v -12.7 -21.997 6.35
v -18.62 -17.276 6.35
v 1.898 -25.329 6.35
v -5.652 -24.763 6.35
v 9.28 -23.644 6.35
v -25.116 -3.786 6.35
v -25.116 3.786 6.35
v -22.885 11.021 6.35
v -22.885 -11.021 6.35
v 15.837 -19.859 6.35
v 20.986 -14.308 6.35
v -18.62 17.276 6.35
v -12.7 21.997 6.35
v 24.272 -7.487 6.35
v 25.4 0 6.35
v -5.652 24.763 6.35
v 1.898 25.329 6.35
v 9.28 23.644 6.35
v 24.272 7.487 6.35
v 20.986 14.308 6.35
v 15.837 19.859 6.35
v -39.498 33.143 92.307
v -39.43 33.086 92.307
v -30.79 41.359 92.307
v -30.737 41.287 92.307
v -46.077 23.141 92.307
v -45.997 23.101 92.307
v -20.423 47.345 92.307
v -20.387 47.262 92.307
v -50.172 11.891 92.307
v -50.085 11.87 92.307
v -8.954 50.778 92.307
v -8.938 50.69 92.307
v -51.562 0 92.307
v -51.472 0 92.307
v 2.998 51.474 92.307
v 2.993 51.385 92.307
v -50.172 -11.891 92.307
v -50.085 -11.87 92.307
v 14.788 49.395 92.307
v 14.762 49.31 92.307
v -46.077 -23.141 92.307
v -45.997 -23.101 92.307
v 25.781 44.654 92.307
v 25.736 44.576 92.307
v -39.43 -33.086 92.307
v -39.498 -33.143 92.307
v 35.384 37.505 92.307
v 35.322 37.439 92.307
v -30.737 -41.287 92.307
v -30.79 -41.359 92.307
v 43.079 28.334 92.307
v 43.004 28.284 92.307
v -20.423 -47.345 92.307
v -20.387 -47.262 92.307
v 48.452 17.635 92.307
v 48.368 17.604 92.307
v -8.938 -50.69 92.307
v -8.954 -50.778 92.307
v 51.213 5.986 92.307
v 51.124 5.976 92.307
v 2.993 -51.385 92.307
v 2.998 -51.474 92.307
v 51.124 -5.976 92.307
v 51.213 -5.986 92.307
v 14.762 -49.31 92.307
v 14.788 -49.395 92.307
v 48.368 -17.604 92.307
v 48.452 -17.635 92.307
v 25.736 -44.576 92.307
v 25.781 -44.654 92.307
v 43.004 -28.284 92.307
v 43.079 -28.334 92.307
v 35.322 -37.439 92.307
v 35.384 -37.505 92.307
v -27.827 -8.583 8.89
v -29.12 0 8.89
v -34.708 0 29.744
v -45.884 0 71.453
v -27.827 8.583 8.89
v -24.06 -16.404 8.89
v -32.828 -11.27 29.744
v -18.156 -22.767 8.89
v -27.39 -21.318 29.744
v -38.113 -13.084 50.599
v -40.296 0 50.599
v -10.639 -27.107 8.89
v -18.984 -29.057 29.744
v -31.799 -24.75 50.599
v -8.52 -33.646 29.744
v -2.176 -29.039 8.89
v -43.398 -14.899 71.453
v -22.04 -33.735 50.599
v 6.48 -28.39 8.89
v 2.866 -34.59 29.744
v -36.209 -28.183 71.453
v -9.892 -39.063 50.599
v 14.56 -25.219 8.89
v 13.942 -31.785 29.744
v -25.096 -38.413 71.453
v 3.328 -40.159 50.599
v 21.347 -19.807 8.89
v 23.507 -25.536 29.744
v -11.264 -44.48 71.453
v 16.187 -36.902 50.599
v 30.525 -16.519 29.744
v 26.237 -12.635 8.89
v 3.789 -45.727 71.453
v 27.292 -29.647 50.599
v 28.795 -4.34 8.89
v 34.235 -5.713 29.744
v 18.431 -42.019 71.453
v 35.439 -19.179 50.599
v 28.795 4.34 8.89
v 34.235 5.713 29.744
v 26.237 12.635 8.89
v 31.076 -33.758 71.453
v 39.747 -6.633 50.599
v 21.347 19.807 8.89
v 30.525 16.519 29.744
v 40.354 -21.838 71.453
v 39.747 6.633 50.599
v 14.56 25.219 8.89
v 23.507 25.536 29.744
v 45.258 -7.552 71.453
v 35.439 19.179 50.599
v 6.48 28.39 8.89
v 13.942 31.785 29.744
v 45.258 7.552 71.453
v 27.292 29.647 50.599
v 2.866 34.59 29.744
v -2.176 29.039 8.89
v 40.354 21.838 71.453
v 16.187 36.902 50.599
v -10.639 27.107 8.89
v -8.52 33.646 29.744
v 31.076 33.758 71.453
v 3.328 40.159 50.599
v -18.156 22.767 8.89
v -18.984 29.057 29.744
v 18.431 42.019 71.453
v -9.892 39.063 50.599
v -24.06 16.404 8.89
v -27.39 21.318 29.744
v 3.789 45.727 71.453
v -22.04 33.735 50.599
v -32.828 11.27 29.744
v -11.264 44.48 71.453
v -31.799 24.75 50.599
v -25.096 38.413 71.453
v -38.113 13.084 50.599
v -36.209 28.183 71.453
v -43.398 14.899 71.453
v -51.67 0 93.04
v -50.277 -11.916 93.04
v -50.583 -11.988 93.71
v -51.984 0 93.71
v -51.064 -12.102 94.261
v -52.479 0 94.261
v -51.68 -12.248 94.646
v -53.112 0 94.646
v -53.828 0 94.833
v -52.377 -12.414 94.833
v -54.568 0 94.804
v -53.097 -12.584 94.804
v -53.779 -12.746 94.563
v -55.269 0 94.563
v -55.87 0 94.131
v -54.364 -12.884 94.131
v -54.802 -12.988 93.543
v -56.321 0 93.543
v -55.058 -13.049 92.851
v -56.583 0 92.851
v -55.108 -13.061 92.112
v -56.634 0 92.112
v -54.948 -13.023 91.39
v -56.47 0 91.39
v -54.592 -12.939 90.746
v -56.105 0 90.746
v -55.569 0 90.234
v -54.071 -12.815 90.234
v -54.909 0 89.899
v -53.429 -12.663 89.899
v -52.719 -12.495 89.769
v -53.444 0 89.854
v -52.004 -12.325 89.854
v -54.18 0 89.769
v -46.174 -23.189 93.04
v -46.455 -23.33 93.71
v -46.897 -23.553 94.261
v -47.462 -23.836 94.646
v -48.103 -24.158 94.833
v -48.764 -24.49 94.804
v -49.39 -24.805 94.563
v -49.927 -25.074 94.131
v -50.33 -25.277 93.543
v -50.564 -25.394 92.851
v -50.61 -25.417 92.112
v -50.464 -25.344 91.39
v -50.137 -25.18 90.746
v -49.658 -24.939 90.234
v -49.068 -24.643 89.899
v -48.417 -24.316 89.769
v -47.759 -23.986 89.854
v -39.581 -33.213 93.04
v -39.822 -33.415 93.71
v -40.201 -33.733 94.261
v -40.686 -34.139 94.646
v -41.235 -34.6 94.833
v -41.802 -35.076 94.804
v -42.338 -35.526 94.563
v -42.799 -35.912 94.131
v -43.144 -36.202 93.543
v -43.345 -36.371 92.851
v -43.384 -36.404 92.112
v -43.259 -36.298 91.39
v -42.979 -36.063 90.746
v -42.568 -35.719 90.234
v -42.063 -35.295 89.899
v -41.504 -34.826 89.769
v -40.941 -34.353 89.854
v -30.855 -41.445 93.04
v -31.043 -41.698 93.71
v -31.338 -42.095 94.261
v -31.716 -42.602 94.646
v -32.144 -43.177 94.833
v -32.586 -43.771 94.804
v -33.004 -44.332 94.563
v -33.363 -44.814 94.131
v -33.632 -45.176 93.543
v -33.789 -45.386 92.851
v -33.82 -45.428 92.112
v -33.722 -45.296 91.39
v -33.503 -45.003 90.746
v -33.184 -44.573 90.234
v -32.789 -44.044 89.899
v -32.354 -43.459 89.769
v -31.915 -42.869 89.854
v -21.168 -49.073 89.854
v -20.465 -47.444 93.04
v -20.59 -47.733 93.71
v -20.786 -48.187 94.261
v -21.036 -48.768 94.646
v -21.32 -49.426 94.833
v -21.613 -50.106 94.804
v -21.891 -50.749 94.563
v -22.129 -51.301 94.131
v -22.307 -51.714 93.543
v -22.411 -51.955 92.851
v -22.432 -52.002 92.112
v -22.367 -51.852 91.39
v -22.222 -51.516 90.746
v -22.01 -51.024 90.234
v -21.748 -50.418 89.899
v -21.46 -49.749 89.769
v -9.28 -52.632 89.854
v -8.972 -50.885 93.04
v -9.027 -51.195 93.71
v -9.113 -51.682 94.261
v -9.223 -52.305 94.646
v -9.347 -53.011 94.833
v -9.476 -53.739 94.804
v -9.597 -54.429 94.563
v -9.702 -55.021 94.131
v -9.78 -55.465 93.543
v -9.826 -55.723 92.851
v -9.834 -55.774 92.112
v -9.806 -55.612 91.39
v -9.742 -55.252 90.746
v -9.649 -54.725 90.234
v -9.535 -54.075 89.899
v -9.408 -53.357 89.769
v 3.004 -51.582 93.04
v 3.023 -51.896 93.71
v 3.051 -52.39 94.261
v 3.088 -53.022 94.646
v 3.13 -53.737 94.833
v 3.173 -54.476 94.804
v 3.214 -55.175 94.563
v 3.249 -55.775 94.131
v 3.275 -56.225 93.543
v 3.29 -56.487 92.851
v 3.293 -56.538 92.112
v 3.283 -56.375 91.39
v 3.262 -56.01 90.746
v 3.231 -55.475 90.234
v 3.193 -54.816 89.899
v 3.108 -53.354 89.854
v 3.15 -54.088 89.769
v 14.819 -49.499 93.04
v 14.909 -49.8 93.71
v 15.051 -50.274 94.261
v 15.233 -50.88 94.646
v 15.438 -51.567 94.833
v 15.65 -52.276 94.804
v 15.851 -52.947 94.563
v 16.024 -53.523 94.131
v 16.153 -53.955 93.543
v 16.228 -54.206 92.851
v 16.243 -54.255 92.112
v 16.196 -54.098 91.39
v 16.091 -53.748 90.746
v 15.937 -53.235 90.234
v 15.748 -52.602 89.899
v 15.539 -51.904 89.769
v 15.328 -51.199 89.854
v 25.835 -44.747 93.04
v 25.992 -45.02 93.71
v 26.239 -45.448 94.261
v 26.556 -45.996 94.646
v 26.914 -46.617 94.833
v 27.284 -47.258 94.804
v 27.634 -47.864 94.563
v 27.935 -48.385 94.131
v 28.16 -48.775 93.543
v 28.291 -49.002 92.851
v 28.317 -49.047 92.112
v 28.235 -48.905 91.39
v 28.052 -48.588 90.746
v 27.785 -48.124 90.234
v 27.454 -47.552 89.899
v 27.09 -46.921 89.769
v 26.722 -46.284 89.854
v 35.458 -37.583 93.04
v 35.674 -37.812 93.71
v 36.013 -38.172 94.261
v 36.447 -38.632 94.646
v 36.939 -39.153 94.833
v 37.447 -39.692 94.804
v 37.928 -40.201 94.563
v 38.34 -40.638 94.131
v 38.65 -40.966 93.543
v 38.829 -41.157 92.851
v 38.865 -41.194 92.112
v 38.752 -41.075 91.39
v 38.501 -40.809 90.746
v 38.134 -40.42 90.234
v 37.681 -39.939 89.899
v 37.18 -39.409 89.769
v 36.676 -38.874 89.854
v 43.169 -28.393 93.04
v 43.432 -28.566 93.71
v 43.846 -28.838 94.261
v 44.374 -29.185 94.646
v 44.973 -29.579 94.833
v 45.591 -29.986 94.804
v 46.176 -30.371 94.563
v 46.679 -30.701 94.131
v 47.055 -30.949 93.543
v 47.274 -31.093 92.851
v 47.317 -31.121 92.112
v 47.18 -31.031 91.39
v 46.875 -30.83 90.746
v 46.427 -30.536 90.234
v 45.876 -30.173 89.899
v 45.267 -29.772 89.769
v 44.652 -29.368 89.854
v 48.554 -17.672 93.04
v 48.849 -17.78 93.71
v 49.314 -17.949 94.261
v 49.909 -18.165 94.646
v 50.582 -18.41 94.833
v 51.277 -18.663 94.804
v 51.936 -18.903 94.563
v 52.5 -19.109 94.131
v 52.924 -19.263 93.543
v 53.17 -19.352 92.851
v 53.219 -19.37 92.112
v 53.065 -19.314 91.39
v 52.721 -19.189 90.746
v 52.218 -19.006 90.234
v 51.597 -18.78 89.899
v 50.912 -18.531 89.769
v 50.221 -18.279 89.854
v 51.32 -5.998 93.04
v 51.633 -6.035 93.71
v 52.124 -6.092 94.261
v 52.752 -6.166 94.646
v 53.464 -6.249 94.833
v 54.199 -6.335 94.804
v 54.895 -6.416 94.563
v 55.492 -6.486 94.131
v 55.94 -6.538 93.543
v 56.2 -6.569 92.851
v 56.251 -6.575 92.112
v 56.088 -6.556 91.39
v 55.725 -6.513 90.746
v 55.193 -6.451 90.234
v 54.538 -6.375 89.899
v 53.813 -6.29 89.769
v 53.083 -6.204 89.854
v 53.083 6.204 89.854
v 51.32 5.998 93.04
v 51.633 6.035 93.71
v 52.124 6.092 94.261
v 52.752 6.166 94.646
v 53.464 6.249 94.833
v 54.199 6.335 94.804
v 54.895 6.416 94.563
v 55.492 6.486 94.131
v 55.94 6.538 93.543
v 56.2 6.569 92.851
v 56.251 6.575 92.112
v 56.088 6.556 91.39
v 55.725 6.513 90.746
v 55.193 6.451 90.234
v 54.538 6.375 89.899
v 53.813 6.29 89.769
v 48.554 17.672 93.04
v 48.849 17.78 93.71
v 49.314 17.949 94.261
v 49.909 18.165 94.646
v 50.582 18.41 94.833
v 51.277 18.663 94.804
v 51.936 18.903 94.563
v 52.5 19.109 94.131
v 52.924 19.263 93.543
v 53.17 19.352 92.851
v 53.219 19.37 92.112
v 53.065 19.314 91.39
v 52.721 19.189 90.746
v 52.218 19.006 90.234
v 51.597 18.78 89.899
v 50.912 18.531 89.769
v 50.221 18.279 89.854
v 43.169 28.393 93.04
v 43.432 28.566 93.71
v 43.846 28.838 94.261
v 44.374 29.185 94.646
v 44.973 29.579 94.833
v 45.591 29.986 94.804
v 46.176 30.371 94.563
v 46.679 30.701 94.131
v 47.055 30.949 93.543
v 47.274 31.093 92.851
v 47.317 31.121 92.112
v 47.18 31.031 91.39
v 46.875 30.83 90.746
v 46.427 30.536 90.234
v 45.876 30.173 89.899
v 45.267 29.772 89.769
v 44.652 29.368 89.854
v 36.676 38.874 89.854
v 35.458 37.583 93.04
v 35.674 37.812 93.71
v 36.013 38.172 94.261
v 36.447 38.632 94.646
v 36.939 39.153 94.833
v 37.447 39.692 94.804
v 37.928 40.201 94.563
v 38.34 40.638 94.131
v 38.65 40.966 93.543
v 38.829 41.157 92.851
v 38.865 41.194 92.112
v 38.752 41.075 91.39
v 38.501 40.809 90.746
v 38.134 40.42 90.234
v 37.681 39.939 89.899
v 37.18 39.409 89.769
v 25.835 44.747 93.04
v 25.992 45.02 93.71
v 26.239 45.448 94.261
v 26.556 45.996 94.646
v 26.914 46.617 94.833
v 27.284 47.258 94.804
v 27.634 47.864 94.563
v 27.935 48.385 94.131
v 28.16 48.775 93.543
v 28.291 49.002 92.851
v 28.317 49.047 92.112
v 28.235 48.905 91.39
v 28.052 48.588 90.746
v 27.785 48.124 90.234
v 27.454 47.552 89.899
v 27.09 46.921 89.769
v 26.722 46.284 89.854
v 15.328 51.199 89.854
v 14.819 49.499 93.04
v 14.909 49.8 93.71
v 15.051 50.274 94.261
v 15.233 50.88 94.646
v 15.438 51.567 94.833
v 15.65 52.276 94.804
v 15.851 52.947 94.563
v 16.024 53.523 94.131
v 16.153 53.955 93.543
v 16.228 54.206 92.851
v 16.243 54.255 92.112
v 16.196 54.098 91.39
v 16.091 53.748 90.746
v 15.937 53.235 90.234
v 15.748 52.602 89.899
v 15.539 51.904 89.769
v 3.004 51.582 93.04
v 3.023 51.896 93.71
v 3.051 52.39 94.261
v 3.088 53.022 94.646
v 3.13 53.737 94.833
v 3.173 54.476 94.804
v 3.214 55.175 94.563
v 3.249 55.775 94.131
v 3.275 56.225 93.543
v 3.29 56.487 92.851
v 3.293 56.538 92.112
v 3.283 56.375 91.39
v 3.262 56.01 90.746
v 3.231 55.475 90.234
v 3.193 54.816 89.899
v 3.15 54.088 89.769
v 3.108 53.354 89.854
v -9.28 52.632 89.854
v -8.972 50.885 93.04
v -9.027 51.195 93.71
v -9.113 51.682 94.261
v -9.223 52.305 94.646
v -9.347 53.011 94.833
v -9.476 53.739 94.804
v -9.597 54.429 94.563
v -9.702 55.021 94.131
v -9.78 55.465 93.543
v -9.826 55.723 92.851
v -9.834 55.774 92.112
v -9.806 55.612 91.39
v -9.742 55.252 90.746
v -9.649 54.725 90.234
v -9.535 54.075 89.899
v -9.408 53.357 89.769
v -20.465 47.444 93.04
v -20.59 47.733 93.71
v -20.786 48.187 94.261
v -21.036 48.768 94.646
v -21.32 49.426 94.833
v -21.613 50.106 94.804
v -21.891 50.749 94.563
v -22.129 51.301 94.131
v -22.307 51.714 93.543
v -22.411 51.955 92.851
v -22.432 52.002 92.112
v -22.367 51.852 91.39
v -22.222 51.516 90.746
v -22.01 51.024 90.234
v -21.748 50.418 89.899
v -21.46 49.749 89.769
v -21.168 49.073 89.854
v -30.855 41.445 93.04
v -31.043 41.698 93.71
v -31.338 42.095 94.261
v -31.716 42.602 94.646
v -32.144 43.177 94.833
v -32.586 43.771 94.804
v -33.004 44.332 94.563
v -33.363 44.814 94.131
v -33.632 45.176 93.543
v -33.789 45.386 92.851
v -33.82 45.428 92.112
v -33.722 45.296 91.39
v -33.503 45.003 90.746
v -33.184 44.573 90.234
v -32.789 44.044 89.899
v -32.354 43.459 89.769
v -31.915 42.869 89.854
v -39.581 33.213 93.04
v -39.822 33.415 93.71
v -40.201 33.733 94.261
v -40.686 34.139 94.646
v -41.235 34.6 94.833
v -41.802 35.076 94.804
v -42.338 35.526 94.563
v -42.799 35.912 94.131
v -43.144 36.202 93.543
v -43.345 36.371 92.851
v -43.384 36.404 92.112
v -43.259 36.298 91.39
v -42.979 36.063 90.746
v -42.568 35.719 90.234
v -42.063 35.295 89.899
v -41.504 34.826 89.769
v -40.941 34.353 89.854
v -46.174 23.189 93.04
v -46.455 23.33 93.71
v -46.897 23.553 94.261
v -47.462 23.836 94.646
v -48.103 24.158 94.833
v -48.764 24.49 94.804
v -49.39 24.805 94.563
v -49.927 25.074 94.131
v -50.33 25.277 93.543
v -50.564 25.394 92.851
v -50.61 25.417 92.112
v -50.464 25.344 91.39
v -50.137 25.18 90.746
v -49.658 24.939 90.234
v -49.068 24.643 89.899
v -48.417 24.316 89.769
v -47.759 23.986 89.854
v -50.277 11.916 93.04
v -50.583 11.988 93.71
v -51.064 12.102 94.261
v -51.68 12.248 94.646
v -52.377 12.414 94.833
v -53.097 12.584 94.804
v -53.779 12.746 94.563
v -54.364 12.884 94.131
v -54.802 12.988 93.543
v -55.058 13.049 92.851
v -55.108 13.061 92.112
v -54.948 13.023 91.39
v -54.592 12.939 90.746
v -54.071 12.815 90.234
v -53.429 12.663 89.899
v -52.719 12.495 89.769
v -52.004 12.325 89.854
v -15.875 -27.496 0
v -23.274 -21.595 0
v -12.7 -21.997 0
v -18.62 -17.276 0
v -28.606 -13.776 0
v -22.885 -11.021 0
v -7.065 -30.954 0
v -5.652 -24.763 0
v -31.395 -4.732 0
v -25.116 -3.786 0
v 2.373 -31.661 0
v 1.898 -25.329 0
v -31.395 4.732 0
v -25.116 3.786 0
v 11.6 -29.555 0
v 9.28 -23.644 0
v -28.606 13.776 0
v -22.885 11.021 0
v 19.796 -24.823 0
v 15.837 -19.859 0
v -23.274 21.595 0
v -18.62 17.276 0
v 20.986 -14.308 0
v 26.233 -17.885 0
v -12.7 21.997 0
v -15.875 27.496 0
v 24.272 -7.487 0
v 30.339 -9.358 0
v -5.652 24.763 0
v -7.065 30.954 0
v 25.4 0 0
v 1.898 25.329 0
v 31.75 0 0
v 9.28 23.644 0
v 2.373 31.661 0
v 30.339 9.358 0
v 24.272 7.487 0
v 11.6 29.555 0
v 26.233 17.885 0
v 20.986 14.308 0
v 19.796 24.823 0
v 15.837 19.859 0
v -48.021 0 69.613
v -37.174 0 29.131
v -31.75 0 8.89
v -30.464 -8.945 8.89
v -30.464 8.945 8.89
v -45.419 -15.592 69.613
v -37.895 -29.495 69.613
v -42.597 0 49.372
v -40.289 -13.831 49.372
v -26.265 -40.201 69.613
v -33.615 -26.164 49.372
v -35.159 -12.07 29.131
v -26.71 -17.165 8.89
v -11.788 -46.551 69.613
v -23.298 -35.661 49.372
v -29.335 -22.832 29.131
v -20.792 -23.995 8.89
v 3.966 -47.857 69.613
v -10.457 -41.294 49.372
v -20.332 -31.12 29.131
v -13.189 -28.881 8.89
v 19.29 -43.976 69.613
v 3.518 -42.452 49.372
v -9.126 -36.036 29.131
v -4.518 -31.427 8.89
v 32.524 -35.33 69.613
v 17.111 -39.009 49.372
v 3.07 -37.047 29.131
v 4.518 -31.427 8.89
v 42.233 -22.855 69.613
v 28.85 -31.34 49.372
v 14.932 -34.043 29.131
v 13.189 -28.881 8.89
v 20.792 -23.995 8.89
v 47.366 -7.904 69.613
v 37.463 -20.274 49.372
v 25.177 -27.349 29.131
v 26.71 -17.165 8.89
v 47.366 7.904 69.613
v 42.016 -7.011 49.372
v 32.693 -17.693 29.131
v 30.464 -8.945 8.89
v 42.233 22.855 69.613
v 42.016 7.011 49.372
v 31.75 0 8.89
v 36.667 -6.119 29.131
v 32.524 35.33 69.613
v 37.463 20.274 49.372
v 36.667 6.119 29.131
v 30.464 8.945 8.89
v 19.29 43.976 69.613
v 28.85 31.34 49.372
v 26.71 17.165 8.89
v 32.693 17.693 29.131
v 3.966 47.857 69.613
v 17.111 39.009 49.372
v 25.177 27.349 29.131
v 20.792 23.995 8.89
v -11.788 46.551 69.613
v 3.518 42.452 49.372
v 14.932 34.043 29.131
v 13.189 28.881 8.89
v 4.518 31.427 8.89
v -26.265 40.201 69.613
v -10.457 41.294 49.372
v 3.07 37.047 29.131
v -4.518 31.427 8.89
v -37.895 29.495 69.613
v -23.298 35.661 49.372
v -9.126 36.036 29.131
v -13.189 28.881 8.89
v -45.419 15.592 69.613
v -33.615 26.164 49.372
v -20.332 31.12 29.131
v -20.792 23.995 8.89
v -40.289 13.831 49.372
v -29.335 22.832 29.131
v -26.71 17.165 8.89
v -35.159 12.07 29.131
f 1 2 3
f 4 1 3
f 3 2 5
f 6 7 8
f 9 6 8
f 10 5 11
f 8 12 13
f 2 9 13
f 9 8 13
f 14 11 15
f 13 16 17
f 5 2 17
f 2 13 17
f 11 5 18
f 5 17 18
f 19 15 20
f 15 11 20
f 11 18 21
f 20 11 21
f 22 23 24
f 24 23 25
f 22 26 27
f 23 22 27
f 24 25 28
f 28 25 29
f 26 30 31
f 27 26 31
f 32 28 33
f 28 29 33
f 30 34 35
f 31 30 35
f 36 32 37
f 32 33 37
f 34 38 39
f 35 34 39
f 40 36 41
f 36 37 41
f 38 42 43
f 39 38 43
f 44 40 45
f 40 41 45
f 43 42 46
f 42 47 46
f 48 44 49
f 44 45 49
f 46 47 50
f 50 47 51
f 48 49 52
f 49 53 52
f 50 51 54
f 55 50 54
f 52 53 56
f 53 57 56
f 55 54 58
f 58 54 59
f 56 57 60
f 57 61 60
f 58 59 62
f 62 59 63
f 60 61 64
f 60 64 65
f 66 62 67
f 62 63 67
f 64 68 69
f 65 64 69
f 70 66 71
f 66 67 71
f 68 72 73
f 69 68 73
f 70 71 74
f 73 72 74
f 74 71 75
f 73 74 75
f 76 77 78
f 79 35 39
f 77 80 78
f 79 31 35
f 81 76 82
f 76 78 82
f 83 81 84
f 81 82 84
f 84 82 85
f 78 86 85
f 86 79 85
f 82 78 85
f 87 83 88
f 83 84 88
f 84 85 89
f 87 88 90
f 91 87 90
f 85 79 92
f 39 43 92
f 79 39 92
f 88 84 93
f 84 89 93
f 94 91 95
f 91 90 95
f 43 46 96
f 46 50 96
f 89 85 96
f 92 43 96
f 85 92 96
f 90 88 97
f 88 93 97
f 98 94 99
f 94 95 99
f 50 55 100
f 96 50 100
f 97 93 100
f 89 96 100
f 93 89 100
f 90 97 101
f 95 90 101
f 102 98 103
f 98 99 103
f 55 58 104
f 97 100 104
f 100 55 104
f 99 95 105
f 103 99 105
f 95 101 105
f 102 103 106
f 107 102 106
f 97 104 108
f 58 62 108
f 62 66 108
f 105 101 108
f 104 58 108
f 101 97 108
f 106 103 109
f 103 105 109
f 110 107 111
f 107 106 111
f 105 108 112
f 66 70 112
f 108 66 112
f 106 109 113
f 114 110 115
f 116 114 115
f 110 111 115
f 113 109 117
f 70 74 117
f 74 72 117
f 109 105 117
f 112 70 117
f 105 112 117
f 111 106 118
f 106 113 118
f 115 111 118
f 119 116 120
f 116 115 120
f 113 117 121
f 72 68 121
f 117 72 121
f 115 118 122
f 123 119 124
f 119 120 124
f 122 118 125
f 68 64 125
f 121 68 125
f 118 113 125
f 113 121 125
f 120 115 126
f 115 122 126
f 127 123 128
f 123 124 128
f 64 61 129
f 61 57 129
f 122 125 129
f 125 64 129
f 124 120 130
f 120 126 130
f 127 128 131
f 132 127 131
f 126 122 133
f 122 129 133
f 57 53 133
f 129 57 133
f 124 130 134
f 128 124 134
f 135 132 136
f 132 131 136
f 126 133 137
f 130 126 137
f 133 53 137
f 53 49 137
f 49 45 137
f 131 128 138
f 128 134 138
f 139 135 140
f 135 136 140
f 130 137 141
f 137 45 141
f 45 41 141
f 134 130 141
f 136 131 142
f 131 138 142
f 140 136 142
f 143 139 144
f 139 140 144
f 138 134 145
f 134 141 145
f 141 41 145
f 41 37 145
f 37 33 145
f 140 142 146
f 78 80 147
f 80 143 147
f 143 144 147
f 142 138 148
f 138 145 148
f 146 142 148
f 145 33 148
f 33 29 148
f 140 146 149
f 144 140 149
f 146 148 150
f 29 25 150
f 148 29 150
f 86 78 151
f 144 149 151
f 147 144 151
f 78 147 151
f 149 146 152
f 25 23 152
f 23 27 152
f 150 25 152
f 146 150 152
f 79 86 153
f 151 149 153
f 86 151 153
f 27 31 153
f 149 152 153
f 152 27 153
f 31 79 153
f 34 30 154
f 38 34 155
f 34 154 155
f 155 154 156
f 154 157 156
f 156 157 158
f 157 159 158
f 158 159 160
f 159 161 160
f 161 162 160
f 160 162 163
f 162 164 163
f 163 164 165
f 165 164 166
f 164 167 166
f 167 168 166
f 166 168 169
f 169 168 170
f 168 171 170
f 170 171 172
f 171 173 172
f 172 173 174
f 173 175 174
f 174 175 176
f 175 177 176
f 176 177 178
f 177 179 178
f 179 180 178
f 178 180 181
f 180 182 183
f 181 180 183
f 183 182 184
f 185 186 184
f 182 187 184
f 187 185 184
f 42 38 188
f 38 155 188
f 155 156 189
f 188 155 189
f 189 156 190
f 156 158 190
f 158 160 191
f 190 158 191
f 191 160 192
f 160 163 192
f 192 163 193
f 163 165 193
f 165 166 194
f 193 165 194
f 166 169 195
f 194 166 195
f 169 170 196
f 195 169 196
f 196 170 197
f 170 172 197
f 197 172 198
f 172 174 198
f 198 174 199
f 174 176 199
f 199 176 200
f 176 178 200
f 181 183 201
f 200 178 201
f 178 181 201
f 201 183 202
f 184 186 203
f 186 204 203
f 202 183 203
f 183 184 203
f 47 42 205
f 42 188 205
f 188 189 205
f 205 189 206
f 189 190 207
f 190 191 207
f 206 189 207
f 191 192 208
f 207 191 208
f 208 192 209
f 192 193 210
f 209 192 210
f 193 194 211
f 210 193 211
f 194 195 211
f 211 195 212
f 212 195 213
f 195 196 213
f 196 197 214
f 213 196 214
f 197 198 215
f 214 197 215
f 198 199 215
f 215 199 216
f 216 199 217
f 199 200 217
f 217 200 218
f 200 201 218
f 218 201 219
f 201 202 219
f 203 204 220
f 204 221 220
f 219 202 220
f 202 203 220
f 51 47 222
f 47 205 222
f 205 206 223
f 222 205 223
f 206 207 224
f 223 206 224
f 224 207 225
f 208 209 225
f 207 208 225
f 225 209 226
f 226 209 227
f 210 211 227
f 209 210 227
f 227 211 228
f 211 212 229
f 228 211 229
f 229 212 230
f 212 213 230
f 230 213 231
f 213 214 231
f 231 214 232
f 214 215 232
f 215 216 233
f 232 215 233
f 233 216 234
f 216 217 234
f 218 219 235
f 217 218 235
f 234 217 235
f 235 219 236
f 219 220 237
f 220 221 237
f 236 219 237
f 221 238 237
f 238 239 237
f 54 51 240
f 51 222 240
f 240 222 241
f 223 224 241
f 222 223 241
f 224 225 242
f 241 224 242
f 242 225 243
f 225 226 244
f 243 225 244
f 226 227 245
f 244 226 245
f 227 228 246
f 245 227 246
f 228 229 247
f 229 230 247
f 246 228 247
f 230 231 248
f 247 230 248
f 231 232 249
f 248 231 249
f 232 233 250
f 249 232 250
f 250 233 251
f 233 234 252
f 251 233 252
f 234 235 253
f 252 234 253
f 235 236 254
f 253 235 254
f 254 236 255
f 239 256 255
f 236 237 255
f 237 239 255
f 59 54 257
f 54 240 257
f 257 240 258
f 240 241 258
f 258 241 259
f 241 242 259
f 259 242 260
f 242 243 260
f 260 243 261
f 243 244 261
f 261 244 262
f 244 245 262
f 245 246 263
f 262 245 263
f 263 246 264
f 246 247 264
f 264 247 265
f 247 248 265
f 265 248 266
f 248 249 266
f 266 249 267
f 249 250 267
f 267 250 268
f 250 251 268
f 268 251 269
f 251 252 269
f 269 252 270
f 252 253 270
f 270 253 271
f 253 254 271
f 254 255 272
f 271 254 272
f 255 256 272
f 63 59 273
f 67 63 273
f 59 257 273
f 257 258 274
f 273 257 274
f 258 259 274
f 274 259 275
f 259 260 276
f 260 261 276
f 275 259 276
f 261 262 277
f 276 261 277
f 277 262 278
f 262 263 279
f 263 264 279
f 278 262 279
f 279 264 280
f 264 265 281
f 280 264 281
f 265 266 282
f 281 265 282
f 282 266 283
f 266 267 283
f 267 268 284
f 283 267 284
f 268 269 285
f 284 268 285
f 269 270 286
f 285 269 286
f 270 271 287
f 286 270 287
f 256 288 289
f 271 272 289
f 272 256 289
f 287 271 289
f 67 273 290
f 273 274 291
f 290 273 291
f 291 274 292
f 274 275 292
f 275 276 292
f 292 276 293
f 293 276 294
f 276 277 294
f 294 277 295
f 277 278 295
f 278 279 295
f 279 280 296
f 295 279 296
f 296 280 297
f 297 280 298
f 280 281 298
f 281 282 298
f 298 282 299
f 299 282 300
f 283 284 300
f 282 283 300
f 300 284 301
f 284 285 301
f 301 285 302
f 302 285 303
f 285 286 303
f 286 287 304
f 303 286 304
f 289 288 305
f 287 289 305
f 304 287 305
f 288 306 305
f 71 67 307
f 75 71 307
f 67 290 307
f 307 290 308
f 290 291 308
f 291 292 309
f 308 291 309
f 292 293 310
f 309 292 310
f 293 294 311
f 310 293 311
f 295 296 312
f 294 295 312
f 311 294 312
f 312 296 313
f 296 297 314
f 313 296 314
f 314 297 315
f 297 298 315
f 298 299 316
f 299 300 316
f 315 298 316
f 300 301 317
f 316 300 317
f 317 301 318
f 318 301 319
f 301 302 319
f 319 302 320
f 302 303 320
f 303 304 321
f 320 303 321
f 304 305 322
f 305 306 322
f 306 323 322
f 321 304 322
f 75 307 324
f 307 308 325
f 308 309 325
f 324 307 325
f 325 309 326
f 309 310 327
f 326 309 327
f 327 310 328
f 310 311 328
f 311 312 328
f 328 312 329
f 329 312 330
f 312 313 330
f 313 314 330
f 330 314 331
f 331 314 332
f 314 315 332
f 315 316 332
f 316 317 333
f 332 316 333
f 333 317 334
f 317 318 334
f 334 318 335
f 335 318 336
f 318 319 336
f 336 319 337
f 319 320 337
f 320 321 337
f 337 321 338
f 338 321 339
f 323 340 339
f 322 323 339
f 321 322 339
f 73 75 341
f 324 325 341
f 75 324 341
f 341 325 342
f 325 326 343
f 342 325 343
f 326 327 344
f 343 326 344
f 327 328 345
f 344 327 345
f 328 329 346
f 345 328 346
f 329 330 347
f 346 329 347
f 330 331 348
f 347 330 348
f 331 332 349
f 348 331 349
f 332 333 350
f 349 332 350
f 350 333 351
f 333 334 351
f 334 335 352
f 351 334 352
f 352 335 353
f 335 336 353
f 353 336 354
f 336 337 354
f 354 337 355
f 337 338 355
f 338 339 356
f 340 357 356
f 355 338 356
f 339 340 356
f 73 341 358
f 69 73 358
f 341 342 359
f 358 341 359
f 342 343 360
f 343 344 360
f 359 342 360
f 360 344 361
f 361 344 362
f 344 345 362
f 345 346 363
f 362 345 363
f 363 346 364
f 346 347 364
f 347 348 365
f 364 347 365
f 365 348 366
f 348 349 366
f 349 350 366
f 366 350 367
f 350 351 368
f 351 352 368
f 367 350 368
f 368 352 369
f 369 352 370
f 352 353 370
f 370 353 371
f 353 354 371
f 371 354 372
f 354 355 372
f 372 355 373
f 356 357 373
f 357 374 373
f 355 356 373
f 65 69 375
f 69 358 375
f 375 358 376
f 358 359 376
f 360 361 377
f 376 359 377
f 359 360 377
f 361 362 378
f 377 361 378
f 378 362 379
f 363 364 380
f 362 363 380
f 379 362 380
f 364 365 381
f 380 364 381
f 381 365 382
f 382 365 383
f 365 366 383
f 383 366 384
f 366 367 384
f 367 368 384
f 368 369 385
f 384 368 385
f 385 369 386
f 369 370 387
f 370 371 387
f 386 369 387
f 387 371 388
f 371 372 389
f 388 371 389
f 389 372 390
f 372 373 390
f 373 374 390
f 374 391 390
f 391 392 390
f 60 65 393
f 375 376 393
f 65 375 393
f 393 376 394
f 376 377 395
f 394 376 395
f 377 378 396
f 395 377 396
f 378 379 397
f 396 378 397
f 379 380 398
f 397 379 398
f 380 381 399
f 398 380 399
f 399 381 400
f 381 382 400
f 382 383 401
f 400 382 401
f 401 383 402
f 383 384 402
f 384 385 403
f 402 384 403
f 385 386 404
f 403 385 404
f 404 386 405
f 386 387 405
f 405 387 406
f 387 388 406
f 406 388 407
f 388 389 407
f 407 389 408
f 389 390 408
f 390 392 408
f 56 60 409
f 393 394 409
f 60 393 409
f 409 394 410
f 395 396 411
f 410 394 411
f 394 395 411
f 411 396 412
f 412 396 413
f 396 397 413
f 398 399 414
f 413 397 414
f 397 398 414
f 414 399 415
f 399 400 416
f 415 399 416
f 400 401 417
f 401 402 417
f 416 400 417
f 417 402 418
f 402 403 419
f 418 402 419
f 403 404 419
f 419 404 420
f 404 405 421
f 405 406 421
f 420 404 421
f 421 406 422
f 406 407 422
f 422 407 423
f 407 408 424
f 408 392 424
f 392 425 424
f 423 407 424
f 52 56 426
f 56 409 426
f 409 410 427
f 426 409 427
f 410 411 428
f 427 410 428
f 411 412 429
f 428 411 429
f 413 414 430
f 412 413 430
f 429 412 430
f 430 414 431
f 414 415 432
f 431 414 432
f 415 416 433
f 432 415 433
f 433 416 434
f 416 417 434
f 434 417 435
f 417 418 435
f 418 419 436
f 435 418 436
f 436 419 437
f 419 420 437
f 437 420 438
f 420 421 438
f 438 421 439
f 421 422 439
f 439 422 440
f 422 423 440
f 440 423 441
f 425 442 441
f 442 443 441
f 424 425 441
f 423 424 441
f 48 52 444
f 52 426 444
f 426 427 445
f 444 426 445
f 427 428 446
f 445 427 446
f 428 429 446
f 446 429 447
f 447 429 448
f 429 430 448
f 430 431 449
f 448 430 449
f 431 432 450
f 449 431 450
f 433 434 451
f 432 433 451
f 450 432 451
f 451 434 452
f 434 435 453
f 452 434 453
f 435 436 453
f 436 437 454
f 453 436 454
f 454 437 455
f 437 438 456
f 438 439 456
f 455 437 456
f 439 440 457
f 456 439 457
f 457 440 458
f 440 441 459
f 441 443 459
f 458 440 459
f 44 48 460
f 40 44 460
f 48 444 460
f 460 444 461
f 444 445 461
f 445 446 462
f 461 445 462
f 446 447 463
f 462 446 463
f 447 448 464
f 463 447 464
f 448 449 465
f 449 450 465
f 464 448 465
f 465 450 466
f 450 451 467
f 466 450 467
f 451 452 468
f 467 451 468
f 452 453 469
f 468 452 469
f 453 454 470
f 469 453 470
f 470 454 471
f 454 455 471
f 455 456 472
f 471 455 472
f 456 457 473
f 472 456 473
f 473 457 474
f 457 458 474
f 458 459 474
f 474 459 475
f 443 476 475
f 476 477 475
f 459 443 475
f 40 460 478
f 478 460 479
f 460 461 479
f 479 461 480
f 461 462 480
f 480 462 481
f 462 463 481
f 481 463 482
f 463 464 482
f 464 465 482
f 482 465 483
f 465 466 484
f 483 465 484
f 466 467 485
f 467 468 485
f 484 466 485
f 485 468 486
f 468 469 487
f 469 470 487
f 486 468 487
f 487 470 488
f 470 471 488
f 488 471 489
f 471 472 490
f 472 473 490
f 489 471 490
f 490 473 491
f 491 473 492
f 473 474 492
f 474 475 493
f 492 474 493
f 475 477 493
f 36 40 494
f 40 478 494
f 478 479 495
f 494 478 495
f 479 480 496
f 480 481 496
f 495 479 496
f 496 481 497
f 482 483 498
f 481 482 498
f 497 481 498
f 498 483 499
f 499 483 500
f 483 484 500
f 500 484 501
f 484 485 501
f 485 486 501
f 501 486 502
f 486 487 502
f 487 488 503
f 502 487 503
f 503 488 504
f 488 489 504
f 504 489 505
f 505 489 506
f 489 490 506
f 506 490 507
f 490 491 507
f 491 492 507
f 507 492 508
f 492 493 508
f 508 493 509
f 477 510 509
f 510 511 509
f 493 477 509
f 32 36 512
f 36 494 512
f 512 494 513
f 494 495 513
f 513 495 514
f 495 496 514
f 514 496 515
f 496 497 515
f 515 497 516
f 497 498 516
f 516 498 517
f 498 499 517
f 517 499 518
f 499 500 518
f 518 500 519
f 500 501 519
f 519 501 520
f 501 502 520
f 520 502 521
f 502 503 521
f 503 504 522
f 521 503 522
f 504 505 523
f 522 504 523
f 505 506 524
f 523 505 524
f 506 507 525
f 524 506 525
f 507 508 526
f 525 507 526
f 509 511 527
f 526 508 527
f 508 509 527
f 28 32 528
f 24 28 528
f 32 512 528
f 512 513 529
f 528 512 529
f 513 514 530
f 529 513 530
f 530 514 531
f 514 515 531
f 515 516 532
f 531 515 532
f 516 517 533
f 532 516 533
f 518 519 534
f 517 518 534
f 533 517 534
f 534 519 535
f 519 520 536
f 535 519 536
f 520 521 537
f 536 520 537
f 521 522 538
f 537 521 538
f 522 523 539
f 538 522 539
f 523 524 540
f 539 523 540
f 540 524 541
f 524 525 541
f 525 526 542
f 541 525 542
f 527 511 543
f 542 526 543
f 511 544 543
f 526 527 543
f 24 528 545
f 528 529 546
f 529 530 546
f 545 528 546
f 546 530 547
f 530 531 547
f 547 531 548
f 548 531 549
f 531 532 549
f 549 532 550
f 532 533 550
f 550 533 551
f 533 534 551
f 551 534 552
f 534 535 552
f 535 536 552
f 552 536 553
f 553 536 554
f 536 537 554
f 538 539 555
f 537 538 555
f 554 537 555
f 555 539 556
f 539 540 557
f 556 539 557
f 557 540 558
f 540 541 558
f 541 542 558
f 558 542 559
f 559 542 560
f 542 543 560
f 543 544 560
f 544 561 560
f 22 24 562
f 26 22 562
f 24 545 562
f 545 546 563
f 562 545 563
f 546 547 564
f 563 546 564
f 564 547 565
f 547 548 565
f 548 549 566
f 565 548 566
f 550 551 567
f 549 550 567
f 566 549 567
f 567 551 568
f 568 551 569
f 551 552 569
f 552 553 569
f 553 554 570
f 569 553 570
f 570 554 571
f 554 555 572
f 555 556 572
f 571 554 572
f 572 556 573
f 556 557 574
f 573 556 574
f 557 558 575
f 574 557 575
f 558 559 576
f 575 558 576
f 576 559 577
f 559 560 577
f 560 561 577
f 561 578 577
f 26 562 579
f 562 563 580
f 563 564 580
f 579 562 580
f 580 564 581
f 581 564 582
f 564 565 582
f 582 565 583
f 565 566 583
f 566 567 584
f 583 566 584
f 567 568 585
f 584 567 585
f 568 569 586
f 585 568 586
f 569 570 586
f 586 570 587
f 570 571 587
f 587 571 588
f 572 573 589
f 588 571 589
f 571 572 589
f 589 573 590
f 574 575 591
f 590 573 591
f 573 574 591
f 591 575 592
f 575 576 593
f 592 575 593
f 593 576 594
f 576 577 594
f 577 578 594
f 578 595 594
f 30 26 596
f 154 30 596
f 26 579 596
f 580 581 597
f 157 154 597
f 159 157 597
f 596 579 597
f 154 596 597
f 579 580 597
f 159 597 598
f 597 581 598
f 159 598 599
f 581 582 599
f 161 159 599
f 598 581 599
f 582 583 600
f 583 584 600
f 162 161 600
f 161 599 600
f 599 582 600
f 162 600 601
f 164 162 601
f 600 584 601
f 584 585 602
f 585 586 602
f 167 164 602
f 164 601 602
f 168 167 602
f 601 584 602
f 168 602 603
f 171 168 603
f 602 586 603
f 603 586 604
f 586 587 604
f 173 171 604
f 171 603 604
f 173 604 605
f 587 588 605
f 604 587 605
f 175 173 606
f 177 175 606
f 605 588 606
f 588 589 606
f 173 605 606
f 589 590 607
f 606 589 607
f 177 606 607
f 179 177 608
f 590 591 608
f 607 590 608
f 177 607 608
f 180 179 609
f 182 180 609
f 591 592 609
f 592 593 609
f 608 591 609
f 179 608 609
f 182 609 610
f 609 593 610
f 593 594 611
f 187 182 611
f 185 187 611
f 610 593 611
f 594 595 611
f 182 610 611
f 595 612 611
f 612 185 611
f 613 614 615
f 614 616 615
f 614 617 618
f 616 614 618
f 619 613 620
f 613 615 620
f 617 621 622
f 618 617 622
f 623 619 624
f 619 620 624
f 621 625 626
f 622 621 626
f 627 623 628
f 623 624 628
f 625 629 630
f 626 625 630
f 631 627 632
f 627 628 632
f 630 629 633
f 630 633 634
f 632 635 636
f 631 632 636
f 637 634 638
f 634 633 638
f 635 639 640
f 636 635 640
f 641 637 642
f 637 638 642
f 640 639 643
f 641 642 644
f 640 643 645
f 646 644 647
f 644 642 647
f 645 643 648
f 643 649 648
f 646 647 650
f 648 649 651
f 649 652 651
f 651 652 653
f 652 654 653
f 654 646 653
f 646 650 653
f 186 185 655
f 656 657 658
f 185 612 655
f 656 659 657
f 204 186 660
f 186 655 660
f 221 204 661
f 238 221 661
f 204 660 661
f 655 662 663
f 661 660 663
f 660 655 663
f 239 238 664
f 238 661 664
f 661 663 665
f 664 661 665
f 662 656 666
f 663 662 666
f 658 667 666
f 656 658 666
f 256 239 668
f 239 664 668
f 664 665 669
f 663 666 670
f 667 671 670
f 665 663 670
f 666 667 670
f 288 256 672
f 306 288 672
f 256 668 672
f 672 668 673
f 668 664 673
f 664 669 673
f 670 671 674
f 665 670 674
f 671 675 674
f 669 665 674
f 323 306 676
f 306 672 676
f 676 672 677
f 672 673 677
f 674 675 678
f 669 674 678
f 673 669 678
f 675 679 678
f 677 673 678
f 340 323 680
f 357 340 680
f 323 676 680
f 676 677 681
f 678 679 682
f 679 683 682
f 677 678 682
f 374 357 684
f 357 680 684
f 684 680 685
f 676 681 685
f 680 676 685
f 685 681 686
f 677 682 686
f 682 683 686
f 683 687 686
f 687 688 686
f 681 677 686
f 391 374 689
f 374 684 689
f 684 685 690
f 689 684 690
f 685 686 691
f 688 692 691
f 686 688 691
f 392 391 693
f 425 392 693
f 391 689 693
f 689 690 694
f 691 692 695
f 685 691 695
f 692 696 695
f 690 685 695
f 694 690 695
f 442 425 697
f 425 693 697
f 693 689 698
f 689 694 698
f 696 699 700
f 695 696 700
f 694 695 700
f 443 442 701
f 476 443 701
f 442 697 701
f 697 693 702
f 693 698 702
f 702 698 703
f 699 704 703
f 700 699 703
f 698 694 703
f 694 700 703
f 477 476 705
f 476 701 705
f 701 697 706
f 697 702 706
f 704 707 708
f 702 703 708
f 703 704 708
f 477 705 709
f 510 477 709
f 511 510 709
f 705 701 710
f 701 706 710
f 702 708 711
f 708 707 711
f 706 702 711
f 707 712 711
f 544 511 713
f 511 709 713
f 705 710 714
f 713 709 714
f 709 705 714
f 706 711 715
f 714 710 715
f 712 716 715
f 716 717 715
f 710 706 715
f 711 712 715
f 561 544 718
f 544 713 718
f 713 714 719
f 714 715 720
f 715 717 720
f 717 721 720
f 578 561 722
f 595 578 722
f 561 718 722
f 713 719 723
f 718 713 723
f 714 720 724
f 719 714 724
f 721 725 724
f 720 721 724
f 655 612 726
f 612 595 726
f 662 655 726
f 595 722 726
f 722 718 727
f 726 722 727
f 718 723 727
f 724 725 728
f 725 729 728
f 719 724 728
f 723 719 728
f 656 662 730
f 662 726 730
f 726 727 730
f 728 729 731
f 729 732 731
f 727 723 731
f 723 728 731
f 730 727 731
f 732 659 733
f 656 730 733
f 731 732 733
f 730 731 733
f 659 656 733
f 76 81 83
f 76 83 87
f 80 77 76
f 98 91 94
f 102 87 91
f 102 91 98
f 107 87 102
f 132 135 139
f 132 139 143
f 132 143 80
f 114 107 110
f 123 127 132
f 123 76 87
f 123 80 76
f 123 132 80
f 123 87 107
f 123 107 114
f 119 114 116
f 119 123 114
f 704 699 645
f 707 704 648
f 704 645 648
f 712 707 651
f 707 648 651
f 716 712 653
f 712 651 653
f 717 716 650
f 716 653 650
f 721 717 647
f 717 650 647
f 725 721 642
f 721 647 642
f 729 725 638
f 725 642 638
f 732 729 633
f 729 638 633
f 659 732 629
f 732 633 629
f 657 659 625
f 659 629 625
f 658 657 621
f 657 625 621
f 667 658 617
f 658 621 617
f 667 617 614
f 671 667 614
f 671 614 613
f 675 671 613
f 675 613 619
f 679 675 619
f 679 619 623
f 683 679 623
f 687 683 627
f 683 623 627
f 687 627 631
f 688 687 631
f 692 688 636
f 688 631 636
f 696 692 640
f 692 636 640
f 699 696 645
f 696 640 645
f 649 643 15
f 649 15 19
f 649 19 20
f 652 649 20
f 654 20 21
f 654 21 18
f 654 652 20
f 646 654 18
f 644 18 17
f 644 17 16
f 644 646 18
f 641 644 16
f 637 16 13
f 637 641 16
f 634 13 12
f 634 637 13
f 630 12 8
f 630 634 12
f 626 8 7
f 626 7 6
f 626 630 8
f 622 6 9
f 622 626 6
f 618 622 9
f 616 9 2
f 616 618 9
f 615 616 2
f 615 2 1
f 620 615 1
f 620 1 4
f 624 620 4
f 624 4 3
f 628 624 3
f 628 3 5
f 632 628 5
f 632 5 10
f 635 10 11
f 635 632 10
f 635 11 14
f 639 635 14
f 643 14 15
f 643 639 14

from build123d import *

# Parameters (mm, degrees)
F0_R     = 31.75
F0_R_2   = 25.4
F1_DEPTH = 6.35
F2_R     = 31.75
F3_DEPTH = 2.54


with BuildPart() as f1:
    # F0 (on Top) → F1 (new body)
    with BuildSketch(Plane.XY):
        Circle(F0_R)
        Circle(F0_R_2, mode=Mode.SUBTRACT)
    extrude(amount=F1_DEPTH)

    # F2 (on face) → F3 (join)
    with BuildSketch(Plane.XY.offset(6.35)):
        Circle(F2_R)
    extrude(amount=F3_DEPTH)

    # F4 (on Front) → F5 (revolve)
    with BuildSketch(Plane.XZ):
        with BuildLine():
            Line((-53.444212, 89.853903), (-31.75, 8.89))
            Line((-31.75, 8.89), (-29.120399, 8.89))
            Line((-29.120399, 8.89), (-51.472011, 92.307354))
            Line((-51.472011, 92.307354), (-51.561613, 92.307354))
            ThreePointArc((-51.561613, 92.307354), (-56.11673, 93.853608), (-53.444212, 89.853903))
        make_face()
    revolve(axis=Axis((0, 0, 53.792427), (0, 0, 1)))


solid = f1.part
